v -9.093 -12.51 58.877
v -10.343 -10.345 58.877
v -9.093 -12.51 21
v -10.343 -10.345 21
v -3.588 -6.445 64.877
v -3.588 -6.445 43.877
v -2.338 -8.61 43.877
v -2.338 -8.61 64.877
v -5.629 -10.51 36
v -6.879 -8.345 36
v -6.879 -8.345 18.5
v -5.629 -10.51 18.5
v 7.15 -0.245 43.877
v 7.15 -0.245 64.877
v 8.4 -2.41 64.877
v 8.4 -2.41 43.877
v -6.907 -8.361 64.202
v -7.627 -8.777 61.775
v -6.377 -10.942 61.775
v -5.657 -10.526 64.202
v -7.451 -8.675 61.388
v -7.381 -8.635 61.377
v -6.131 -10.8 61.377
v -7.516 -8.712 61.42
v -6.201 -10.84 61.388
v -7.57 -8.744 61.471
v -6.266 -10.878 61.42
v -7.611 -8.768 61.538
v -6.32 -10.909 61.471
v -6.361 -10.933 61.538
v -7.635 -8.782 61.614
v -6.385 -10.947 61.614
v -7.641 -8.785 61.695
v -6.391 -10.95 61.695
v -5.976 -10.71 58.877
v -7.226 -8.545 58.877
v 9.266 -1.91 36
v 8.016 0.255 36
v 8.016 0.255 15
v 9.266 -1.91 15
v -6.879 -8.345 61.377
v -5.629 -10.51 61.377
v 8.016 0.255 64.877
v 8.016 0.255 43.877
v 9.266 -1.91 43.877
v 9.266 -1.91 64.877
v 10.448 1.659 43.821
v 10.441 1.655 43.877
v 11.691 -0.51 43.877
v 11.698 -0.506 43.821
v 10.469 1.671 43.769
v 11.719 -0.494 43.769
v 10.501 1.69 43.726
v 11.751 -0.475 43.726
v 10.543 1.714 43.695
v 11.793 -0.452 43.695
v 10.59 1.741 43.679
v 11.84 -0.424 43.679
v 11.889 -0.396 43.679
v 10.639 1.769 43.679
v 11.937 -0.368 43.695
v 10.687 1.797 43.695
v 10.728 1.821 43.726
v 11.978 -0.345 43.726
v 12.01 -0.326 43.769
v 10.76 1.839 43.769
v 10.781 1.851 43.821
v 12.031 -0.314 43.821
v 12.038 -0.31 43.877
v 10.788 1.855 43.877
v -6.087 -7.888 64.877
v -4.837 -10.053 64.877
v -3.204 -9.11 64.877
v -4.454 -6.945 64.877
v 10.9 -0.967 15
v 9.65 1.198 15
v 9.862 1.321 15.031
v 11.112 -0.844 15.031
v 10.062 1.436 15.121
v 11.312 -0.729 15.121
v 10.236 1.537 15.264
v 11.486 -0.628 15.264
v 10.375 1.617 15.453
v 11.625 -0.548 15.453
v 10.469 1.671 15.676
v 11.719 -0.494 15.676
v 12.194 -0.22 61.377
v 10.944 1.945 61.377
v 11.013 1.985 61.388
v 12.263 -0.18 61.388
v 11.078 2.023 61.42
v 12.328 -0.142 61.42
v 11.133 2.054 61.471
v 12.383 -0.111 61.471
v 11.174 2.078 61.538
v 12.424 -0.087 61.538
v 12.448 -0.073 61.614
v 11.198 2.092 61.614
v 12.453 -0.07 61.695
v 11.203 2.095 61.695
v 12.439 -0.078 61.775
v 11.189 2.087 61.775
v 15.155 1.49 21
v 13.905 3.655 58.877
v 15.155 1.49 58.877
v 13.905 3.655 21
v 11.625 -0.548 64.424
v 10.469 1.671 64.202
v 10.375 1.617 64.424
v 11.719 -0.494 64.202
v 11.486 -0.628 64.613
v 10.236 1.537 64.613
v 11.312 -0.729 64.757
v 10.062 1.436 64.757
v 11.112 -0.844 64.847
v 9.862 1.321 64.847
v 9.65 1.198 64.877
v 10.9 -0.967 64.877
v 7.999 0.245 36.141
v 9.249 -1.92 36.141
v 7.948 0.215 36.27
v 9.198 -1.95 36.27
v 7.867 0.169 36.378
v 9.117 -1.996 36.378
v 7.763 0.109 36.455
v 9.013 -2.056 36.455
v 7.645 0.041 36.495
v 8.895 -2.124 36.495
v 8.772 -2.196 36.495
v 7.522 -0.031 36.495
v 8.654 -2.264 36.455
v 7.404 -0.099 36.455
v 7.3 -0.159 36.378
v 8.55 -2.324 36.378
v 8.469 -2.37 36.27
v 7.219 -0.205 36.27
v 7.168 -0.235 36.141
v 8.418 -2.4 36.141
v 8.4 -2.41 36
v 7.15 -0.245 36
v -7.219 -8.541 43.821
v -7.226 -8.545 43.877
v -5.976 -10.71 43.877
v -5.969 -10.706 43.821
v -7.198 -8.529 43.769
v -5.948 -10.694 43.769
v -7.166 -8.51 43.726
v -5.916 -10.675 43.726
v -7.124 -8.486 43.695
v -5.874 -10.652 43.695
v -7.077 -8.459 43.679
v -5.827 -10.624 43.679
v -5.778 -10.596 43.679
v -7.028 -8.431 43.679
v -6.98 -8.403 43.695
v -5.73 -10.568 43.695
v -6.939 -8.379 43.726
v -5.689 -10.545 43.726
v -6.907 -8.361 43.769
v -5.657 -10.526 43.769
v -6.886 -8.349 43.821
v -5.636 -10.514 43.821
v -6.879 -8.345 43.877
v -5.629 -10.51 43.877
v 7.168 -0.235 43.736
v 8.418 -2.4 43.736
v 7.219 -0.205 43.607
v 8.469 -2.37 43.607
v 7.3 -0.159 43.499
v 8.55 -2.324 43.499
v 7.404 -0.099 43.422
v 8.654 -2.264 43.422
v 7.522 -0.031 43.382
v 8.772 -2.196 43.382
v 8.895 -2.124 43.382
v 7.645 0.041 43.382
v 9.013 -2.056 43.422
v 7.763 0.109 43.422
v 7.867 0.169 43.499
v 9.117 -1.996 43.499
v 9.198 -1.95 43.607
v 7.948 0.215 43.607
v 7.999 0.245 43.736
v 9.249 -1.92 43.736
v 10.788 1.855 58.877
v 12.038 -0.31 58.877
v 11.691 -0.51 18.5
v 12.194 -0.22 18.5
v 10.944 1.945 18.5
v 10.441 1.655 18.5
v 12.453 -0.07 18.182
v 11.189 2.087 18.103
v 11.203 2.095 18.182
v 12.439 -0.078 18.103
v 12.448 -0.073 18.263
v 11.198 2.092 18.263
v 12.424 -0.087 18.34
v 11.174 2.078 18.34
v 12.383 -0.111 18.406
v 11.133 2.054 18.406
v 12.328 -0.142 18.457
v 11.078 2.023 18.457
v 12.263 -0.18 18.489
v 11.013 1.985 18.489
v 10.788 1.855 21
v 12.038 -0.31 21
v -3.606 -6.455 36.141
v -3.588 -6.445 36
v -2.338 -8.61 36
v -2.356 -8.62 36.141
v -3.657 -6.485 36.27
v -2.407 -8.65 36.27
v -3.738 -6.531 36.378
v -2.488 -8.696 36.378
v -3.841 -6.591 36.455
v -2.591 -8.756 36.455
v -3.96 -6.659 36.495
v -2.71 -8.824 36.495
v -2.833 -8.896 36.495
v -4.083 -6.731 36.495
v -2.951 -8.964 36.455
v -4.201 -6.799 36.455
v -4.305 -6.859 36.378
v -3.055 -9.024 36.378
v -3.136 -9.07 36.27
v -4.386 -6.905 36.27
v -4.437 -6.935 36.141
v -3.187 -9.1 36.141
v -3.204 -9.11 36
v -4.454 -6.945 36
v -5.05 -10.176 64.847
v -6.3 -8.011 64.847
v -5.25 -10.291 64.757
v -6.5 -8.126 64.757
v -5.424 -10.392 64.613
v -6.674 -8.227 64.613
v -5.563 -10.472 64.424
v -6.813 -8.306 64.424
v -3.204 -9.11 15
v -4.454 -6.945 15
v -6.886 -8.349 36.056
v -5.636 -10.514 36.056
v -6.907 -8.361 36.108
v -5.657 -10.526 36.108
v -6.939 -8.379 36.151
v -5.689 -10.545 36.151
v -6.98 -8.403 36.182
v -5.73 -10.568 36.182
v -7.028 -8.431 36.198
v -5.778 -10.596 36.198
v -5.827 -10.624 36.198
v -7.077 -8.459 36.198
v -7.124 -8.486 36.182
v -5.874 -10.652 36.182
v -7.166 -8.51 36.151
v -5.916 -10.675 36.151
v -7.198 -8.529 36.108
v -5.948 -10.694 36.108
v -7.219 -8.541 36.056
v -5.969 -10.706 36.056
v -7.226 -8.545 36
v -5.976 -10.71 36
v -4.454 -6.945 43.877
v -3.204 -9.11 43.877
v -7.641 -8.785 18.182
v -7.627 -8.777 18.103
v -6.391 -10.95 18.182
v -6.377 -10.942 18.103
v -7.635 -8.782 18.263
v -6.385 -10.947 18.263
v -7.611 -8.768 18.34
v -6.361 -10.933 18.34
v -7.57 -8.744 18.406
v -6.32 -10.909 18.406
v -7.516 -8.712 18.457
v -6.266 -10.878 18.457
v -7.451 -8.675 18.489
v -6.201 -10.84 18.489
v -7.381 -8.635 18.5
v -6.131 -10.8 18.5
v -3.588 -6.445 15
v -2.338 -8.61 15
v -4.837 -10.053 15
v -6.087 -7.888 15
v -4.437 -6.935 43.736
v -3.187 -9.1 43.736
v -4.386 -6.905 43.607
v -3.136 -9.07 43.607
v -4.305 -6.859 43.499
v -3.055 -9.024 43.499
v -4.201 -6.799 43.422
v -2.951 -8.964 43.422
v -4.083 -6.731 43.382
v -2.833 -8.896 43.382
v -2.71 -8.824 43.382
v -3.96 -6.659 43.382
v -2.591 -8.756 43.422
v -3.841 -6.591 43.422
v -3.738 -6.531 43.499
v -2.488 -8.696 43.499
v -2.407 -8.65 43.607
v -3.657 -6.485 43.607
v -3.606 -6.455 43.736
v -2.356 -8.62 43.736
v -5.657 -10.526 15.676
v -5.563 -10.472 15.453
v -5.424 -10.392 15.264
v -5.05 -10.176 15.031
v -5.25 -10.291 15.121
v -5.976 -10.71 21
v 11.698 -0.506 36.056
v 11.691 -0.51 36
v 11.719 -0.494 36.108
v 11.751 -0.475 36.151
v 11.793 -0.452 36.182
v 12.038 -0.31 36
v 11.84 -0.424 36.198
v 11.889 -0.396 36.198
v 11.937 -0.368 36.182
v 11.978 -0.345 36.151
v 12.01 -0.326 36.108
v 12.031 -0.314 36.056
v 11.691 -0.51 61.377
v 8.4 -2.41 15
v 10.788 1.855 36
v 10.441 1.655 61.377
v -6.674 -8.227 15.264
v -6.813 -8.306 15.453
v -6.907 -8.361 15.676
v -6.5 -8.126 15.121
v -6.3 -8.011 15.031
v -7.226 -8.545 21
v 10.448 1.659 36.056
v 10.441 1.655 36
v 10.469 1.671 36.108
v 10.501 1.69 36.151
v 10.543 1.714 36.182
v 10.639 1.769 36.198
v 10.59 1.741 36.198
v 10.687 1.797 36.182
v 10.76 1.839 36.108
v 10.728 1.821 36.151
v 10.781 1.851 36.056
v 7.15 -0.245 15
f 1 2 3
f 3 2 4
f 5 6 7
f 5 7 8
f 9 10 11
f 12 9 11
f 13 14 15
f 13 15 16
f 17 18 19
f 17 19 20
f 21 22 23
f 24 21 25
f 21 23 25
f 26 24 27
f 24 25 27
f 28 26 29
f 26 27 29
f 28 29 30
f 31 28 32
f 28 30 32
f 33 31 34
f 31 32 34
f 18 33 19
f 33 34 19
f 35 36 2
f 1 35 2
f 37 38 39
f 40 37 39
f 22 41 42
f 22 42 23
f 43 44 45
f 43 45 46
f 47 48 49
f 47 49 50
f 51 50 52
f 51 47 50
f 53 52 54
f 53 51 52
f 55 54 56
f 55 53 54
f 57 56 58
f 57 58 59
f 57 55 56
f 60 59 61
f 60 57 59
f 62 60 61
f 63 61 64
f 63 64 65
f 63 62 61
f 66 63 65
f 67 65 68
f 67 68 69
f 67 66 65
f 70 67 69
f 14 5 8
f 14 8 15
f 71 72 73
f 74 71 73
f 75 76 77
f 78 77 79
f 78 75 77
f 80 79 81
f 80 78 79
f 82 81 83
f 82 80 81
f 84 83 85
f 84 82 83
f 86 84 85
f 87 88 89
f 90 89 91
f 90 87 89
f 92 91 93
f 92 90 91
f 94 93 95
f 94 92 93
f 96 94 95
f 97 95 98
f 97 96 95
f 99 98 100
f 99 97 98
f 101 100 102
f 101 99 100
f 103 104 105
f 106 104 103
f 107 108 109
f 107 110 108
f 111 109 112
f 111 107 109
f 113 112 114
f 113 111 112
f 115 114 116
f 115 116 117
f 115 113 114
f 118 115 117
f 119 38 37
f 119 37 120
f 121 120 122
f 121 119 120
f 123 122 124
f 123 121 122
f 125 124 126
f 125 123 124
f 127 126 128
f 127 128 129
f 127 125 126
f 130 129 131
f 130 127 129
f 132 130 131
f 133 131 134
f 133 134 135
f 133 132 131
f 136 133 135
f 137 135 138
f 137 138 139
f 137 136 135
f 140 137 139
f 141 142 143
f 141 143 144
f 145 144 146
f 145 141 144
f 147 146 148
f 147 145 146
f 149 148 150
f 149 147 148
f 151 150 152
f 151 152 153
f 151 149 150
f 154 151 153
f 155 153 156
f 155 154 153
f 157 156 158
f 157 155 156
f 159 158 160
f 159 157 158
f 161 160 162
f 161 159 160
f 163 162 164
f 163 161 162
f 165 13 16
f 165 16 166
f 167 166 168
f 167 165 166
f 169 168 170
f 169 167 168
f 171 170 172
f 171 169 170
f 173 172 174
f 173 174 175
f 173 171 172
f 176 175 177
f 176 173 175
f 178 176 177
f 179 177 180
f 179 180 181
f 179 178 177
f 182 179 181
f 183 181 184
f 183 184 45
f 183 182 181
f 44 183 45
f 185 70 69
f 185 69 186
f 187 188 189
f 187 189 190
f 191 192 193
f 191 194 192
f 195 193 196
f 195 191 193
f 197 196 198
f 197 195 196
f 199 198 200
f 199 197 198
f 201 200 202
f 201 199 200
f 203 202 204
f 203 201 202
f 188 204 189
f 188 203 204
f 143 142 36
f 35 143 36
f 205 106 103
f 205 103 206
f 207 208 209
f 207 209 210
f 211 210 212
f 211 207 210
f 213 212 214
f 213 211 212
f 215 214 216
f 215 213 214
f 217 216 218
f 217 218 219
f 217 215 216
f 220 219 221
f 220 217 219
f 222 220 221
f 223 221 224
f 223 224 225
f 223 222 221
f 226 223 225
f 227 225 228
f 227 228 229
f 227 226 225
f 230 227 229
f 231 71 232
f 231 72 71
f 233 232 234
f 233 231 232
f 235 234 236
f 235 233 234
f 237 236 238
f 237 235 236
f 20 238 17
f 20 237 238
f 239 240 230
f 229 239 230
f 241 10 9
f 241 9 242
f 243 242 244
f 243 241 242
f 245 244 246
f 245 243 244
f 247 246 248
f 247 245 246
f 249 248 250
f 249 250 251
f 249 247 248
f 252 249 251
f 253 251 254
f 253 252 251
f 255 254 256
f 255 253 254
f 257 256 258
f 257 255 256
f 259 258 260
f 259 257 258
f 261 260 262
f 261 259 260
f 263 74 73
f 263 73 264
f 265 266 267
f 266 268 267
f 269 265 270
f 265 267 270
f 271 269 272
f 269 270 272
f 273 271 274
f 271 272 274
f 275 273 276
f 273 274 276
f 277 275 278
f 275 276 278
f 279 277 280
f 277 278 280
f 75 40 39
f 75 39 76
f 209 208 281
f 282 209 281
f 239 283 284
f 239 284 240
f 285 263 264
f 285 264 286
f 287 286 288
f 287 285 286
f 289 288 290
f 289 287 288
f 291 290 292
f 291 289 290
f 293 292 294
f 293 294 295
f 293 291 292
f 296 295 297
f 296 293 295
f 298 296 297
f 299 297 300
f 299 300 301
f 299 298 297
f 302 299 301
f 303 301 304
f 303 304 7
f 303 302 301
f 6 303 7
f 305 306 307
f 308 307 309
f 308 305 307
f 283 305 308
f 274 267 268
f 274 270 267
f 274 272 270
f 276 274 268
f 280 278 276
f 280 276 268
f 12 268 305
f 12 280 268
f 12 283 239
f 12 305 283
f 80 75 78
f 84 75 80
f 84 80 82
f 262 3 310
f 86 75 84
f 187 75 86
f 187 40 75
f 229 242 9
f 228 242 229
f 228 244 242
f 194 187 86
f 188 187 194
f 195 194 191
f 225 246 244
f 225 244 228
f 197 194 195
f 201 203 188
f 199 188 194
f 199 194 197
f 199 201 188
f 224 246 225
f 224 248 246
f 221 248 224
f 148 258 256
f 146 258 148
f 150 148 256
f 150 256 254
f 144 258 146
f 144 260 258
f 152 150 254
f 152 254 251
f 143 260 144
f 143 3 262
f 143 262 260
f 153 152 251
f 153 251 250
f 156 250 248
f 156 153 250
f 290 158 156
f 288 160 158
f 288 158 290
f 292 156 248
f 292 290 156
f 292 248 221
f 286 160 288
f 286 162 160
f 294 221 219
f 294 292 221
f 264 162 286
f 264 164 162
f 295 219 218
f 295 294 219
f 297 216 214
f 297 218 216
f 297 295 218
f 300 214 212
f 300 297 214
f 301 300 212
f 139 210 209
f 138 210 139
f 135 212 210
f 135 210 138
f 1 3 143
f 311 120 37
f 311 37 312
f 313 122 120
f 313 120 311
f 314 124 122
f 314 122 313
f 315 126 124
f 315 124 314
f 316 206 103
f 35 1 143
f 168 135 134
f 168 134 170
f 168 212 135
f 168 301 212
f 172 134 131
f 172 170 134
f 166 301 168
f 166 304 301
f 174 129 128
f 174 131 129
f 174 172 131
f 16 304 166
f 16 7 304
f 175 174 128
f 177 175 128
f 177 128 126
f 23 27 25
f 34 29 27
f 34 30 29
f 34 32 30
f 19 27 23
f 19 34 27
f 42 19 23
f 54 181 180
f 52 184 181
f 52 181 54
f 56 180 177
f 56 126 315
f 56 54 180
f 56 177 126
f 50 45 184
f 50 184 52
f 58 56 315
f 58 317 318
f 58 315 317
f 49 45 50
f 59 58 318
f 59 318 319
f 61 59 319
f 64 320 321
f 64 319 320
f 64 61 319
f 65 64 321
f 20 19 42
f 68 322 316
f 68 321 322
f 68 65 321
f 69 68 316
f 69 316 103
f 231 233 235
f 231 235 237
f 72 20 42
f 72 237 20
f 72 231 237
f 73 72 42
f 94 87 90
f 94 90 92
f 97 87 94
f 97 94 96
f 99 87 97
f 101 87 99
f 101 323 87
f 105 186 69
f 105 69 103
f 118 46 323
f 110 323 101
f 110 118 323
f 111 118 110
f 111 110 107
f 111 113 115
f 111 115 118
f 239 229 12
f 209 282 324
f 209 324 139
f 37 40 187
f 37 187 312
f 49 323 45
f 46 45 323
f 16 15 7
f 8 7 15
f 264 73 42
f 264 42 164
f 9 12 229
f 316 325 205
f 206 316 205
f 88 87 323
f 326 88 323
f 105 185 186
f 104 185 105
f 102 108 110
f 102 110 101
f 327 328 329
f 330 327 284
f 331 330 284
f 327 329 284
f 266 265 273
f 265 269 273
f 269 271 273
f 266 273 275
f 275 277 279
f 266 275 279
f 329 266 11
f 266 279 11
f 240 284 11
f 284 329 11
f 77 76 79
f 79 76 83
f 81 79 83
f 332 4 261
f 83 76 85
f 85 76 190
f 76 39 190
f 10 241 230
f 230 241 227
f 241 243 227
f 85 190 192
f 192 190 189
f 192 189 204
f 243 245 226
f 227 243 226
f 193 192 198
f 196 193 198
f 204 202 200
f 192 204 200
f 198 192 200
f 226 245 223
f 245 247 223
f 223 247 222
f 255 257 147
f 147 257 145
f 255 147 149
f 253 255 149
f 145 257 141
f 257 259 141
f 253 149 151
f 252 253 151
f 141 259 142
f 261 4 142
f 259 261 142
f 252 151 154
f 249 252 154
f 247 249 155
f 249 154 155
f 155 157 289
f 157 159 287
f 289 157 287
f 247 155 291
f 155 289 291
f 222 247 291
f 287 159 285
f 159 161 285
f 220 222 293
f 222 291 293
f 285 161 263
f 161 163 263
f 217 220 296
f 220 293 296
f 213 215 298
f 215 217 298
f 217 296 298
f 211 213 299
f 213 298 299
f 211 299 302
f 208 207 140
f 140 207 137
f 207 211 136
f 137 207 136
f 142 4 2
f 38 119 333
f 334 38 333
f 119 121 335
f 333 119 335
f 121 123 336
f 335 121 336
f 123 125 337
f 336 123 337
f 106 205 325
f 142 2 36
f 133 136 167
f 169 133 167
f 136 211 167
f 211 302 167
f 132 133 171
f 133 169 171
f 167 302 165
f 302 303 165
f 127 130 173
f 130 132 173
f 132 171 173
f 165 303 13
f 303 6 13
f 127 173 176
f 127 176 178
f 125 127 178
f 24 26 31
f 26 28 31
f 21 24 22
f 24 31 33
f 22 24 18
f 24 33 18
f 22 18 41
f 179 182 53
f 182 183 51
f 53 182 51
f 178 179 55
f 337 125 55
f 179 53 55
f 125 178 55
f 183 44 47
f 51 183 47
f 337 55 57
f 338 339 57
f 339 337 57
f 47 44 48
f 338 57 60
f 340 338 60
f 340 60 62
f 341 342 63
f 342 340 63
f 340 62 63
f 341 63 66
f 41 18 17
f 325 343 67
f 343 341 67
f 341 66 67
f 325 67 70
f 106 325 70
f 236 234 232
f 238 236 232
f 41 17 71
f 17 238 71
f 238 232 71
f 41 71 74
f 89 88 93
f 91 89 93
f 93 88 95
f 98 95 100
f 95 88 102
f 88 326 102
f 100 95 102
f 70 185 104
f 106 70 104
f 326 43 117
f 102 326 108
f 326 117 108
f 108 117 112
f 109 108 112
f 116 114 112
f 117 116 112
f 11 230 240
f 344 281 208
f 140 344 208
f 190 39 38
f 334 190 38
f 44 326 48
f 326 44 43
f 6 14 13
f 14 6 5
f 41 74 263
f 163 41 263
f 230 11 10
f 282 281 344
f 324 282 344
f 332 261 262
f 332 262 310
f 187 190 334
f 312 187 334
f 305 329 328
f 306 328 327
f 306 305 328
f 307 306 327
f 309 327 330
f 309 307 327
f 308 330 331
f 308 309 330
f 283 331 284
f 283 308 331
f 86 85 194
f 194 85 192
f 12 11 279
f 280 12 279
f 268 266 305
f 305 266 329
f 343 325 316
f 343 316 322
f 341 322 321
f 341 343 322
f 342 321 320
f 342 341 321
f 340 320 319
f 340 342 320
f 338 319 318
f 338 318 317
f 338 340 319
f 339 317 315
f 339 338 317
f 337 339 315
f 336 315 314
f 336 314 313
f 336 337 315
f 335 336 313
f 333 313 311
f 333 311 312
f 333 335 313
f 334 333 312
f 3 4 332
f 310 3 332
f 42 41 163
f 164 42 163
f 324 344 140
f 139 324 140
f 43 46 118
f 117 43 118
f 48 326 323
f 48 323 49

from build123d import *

# Parameters (mm, degrees)
PAD003_DEPTH = 2.5
FILLET002_R  = 1
FILLET003_R  = 0.3


with BuildPart() as part:
    # Sketch033 (on Face94 of Binder) → Pad003 (new body)
    with BuildSketch(Plane(origin=(1.8936722157, -3.2799364905, 0), x_dir=(0.8660254038, 0.5, 0), z_dir=(0.5, -0.8660254038, 0))):
        with BuildLine():
            Line((-10.53, 58.8773011628), (-14.13, 58.8773011628))
            Line((-14.13, 58.8773011628), (-14.13, 21))
            Line((-14.13, 21), (-10.53, 21))
            Line((-10.53, 36), (-10.53, 21))
            ThreePointArc((-10.13, 36), (-10.33, 36.2), (-10.53, 36))
            Line((-10.13, 21), (-10.13, 36))
            Line((-10.13, 21), (-10.13, 18.5))
            Line((-10.13, 18.5), (-11.13, 18.5))
            Line((-11.13, 18.5), (-9.93, 15))
            Line((-9.93, 15), (-7.33, 15))
            Line((-7.33, 15), (-7.33, 36))
            ThreePointArc((-6.33, 36), (-6.83, 36.5), (-7.33, 36))
            Line((-6.33, 36), (-6.33, 15))
            Line((-6.33, 15), (6.07, 15))
            Line((6.07, 15), (6.07, 36))
            ThreePointArc((7.07, 36), (6.57, 36.5), (6.07, 36))
            Line((7.07, 36), (7.07, 15))
            Line((7.07, 15), (9.67, 15))
            Line((9.67, 15), (10.87, 18.5))
            Line((10.87, 18.5), (9.87, 18.5))
            Line((9.87, 21), (9.87, 18.5))
            Line((9.87, 21), (9.87, 36))
            ThreePointArc((10.27, 36), (10.07, 36.2), (9.87, 36))
            Line((10.27, 36), (10.27, 21))
            Line((13.87, 21), (10.27, 21))
            Line((13.87, 58.8773011628), (13.87, 21))
            Line((10.27, 58.8773011628), (13.87, 58.8773011628))
            Line((10.27, 43.8773011628), (10.27, 58.8773011628))
            ThreePointArc((9.87, 43.8773011628), (10.07, 43.6773011628), (10.27, 43.8773011628))
            Line((9.87, 58.8773011628), (9.87, 43.8773011628))
            Line((9.87, 61.3773011628), (9.87, 58.8773011628))
            Line((10.87, 61.3773011628), (9.87, 61.3773011628))
            Line((9.67, 64.8773011628), (10.87, 61.3773011628))
            Line((7.07, 64.8773011628), (9.67, 64.8773011628))
            Line((7.07, 43.8773011628), (7.07, 64.8773011628))
            ThreePointArc((6.07, 43.8773011628), (6.57, 43.3773011628), (7.07, 43.8773011628))
            Line((6.07, 64.8773011628), (6.07, 43.8773011628))
            Line((-6.33, 64.8773011628), (6.07, 64.8773011628))
            Line((-6.33, 43.8773011628), (-6.33, 64.8773011628))
            ThreePointArc((-7.33, 43.8773011628), (-6.83, 43.3773011628), (-6.33, 43.8773011628))
            Line((-7.33, 64.8773011628), (-7.33, 43.8773011628))
            Line((-9.93, 64.8773011628), (-7.33, 64.8773011628))
            Line((-11.13, 61.3773011628), (-9.93, 64.8773011628))
            Line((-10.13, 61.3773011628), (-11.13, 61.3773011628))
            Line((-10.13, 58.8773011628), (-10.13, 61.3773011628))
            Line((-10.13, 58.8773011628), (-10.13, 43.8773011628))
            ThreePointArc((-10.53, 43.8773011628), (-10.33, 43.6773011628), (-10.13, 43.8773011628))
            Line((-10.53, 43.8773011628), (-10.53, 58.8773011628))
        make_face()
    extrude(amount=PAD003_DEPTH)

    # Fillet002
    fillet002_edges = [part.edges().sort_by_distance(p)[0] for p in [
        (10.893138, 0.472532, 15),
        (-6.08096, -9.327468, 15),
        (-6.08096, -9.327468, 64.877301),
        (10.893138, 0.472532, 64.877301),
    ]]
    fillet(fillet002_edges, radius=FILLET002_R)

    # Fillet003
    fillet003_edges = [part.edges().sort_by_distance(p)[0] for p in [
        (11.932368, 1.072532, 18.5),
        (-7.120191, -9.927468, 18.5),
        (-7.120191, -9.927468, 61.377301),
        (11.932368, 1.072532, 61.377301),
    ]]
    fillet(fillet003_edges, radius=FILLET003_R)


solid = part.part
